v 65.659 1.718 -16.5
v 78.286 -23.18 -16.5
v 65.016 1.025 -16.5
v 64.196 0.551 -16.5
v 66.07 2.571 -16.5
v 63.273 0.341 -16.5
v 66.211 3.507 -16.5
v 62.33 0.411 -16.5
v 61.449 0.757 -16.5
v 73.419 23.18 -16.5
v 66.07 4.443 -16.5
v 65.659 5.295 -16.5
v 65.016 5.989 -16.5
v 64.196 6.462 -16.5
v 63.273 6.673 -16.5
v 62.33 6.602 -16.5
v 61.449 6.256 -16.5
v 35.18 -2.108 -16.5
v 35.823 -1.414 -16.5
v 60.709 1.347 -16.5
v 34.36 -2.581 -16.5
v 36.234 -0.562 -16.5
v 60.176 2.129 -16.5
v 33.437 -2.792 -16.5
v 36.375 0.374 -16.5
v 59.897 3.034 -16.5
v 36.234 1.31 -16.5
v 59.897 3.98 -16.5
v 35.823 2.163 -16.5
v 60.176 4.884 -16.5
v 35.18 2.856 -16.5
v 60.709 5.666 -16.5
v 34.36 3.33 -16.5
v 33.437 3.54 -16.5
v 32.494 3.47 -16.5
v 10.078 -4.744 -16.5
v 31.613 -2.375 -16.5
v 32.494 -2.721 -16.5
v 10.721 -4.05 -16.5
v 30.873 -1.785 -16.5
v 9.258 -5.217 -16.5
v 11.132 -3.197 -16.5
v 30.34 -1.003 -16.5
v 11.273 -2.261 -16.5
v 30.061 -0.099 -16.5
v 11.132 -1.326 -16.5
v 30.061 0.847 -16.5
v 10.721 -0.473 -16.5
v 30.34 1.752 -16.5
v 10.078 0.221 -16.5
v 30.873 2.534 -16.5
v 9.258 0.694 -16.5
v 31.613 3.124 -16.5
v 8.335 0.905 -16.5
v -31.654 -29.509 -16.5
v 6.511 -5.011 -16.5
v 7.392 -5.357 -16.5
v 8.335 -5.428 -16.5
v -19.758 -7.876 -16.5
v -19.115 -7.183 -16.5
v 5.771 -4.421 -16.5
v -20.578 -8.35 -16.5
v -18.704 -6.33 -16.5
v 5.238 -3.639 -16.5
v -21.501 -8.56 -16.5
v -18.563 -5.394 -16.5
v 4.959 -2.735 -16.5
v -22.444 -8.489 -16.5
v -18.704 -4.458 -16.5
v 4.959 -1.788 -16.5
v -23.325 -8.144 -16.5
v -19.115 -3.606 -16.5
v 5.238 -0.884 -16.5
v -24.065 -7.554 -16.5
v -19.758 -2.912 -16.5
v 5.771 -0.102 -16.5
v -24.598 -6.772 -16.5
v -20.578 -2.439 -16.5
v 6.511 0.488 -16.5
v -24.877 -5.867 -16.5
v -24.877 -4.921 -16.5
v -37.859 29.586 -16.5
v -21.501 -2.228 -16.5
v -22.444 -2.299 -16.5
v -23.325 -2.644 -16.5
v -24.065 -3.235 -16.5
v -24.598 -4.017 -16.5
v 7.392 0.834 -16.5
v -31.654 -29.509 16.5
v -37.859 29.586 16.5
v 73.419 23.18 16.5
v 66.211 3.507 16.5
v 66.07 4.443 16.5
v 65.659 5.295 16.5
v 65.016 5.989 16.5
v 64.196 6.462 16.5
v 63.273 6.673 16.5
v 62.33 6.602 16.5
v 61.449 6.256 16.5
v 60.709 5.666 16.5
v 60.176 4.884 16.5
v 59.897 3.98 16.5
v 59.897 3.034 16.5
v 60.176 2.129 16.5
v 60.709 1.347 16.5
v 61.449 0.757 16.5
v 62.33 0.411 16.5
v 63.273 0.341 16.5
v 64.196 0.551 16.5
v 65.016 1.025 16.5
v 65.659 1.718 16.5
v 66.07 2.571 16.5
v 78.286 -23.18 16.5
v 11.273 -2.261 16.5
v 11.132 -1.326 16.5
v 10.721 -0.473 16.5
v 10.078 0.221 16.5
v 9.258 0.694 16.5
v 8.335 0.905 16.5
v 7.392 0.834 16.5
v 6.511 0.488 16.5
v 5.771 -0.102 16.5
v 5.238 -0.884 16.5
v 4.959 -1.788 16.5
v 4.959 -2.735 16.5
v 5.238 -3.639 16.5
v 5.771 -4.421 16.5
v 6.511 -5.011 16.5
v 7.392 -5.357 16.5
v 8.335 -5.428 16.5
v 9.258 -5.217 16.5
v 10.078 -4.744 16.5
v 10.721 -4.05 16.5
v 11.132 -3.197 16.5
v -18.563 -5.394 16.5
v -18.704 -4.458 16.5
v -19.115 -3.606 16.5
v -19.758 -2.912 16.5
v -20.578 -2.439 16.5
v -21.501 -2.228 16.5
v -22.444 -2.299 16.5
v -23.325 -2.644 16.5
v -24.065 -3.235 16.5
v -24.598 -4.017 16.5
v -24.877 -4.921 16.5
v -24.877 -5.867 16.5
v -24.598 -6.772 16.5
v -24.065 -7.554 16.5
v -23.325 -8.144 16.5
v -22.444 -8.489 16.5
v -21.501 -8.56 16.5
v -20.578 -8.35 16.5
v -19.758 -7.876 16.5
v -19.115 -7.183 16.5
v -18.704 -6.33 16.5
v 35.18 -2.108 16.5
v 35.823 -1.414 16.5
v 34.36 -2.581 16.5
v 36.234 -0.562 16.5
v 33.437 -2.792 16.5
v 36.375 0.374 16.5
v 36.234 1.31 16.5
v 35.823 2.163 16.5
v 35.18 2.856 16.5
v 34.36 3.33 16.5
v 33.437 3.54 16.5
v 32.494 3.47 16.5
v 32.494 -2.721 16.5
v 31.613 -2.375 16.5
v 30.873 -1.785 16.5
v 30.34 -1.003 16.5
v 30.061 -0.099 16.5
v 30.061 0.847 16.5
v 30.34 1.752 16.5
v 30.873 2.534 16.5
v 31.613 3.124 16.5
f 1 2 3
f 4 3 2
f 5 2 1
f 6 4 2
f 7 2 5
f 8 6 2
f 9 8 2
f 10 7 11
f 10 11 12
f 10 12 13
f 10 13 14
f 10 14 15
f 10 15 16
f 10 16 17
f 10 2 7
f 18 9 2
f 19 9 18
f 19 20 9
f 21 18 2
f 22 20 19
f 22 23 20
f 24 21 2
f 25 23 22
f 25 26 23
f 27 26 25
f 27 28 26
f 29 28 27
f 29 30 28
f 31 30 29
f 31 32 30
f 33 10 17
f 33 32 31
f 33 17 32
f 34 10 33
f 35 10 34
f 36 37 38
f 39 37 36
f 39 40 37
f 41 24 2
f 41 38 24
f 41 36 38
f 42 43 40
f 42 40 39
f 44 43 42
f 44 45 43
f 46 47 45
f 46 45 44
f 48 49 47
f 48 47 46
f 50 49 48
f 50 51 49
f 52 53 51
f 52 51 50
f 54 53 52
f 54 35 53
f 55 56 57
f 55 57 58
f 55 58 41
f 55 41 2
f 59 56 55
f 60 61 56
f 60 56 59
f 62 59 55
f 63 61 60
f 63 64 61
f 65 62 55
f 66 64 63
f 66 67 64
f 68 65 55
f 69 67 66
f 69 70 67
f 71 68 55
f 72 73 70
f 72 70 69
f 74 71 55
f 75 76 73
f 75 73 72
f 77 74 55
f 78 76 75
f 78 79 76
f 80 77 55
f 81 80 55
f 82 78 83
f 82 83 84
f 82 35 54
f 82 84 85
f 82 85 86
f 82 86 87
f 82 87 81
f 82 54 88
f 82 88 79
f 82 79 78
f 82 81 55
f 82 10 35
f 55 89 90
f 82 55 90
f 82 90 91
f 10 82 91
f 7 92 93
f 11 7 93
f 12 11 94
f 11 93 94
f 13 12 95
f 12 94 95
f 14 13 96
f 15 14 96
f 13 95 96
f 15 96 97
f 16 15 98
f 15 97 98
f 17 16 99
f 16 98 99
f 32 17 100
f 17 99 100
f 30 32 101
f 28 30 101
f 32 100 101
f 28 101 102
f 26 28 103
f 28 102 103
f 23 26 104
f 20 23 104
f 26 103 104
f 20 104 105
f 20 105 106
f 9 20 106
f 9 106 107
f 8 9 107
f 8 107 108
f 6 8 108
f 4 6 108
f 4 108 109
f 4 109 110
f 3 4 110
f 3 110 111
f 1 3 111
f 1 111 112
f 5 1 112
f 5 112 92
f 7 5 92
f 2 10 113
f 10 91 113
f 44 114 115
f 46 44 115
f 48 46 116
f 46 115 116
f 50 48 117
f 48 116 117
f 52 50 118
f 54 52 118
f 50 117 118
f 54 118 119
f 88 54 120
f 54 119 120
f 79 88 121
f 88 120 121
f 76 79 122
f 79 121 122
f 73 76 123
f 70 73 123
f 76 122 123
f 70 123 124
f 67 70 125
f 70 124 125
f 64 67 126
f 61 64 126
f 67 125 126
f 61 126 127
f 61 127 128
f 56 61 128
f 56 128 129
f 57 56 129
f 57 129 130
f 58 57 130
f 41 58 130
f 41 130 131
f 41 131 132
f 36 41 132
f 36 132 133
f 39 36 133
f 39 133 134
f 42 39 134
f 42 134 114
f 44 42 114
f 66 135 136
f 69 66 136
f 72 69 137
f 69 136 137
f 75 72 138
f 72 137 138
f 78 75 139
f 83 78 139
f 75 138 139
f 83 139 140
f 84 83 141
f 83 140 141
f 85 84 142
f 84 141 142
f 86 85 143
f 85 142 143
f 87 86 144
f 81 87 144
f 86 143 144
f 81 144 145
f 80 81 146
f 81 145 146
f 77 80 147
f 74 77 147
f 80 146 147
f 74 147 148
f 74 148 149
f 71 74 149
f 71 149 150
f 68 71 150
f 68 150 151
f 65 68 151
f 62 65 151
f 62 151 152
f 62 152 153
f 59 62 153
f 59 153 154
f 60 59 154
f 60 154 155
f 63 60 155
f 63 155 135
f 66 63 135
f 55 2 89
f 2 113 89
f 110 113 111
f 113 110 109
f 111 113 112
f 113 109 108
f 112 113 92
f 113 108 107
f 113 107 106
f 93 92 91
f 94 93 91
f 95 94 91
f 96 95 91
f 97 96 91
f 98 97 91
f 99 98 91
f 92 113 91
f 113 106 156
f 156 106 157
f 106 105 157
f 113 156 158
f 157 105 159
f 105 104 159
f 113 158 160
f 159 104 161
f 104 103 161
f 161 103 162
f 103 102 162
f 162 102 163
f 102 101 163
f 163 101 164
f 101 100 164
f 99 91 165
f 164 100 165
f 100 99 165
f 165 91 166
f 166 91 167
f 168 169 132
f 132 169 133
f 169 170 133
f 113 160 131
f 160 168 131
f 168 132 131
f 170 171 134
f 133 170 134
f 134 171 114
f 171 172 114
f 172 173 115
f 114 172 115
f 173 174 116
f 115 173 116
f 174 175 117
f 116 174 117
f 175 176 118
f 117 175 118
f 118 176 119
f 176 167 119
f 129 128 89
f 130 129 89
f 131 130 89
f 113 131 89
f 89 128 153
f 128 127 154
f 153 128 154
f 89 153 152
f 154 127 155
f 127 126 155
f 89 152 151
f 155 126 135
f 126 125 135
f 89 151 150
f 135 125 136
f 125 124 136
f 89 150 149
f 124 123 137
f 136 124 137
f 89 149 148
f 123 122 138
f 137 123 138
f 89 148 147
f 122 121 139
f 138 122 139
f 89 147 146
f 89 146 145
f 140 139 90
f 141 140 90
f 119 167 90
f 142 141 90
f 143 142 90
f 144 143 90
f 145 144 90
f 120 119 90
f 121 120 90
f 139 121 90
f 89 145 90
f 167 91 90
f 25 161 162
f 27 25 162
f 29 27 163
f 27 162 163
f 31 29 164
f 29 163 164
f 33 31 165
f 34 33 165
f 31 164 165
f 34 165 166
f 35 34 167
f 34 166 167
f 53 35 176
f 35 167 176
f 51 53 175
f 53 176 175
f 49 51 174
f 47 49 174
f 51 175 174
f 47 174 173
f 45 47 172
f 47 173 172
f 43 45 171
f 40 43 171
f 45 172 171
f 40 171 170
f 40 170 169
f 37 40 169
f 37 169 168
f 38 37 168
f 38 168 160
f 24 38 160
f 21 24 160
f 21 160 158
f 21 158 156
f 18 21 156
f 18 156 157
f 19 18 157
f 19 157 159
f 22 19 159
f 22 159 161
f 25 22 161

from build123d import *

# Parameters (mm, degrees)
SALIENTE_EXTRUIR1_DEPTH = 16.5
CROQUIS2_R              = 3.175
CORTAR_EXTRUIR1_DEPTH   = 90.961328235


with BuildPart() as part:
    # Croquis1 → Saliente-Extruir1 (new, symmetric)
    with BuildSketch(Plane.XY):
        Polygon((-37.85864365, 29.585656648), (73.418614151, 23.179824137), (78.286202478, -23.179824137), (-31.65396053, -29.508684898), align=None)
    extrude(amount=SALIENTE_EXTRUIR1_DEPTH, both=True)

    # Croquis2 → Cortar-Extruir1 (cut, through all)
    with BuildSketch(Plane.XY.offset(16.5)):
        with Locations((63.036149834, 3.50684658)):
            Circle(CROQUIS2_R)
        with Locations((33.200158154, 0.374179913)):
            Circle(CROQUIS2_R)
        with Locations((8.09814382, -2.261436976)):
            Circle(CROQUIS2_R)
        with Locations((-21.73784786, -5.394103642)):
            Circle(CROQUIS2_R)
    extrude(amount=-CORTAR_EXTRUIR1_DEPTH, mode=Mode.SUBTRACT)


solid = part.part
